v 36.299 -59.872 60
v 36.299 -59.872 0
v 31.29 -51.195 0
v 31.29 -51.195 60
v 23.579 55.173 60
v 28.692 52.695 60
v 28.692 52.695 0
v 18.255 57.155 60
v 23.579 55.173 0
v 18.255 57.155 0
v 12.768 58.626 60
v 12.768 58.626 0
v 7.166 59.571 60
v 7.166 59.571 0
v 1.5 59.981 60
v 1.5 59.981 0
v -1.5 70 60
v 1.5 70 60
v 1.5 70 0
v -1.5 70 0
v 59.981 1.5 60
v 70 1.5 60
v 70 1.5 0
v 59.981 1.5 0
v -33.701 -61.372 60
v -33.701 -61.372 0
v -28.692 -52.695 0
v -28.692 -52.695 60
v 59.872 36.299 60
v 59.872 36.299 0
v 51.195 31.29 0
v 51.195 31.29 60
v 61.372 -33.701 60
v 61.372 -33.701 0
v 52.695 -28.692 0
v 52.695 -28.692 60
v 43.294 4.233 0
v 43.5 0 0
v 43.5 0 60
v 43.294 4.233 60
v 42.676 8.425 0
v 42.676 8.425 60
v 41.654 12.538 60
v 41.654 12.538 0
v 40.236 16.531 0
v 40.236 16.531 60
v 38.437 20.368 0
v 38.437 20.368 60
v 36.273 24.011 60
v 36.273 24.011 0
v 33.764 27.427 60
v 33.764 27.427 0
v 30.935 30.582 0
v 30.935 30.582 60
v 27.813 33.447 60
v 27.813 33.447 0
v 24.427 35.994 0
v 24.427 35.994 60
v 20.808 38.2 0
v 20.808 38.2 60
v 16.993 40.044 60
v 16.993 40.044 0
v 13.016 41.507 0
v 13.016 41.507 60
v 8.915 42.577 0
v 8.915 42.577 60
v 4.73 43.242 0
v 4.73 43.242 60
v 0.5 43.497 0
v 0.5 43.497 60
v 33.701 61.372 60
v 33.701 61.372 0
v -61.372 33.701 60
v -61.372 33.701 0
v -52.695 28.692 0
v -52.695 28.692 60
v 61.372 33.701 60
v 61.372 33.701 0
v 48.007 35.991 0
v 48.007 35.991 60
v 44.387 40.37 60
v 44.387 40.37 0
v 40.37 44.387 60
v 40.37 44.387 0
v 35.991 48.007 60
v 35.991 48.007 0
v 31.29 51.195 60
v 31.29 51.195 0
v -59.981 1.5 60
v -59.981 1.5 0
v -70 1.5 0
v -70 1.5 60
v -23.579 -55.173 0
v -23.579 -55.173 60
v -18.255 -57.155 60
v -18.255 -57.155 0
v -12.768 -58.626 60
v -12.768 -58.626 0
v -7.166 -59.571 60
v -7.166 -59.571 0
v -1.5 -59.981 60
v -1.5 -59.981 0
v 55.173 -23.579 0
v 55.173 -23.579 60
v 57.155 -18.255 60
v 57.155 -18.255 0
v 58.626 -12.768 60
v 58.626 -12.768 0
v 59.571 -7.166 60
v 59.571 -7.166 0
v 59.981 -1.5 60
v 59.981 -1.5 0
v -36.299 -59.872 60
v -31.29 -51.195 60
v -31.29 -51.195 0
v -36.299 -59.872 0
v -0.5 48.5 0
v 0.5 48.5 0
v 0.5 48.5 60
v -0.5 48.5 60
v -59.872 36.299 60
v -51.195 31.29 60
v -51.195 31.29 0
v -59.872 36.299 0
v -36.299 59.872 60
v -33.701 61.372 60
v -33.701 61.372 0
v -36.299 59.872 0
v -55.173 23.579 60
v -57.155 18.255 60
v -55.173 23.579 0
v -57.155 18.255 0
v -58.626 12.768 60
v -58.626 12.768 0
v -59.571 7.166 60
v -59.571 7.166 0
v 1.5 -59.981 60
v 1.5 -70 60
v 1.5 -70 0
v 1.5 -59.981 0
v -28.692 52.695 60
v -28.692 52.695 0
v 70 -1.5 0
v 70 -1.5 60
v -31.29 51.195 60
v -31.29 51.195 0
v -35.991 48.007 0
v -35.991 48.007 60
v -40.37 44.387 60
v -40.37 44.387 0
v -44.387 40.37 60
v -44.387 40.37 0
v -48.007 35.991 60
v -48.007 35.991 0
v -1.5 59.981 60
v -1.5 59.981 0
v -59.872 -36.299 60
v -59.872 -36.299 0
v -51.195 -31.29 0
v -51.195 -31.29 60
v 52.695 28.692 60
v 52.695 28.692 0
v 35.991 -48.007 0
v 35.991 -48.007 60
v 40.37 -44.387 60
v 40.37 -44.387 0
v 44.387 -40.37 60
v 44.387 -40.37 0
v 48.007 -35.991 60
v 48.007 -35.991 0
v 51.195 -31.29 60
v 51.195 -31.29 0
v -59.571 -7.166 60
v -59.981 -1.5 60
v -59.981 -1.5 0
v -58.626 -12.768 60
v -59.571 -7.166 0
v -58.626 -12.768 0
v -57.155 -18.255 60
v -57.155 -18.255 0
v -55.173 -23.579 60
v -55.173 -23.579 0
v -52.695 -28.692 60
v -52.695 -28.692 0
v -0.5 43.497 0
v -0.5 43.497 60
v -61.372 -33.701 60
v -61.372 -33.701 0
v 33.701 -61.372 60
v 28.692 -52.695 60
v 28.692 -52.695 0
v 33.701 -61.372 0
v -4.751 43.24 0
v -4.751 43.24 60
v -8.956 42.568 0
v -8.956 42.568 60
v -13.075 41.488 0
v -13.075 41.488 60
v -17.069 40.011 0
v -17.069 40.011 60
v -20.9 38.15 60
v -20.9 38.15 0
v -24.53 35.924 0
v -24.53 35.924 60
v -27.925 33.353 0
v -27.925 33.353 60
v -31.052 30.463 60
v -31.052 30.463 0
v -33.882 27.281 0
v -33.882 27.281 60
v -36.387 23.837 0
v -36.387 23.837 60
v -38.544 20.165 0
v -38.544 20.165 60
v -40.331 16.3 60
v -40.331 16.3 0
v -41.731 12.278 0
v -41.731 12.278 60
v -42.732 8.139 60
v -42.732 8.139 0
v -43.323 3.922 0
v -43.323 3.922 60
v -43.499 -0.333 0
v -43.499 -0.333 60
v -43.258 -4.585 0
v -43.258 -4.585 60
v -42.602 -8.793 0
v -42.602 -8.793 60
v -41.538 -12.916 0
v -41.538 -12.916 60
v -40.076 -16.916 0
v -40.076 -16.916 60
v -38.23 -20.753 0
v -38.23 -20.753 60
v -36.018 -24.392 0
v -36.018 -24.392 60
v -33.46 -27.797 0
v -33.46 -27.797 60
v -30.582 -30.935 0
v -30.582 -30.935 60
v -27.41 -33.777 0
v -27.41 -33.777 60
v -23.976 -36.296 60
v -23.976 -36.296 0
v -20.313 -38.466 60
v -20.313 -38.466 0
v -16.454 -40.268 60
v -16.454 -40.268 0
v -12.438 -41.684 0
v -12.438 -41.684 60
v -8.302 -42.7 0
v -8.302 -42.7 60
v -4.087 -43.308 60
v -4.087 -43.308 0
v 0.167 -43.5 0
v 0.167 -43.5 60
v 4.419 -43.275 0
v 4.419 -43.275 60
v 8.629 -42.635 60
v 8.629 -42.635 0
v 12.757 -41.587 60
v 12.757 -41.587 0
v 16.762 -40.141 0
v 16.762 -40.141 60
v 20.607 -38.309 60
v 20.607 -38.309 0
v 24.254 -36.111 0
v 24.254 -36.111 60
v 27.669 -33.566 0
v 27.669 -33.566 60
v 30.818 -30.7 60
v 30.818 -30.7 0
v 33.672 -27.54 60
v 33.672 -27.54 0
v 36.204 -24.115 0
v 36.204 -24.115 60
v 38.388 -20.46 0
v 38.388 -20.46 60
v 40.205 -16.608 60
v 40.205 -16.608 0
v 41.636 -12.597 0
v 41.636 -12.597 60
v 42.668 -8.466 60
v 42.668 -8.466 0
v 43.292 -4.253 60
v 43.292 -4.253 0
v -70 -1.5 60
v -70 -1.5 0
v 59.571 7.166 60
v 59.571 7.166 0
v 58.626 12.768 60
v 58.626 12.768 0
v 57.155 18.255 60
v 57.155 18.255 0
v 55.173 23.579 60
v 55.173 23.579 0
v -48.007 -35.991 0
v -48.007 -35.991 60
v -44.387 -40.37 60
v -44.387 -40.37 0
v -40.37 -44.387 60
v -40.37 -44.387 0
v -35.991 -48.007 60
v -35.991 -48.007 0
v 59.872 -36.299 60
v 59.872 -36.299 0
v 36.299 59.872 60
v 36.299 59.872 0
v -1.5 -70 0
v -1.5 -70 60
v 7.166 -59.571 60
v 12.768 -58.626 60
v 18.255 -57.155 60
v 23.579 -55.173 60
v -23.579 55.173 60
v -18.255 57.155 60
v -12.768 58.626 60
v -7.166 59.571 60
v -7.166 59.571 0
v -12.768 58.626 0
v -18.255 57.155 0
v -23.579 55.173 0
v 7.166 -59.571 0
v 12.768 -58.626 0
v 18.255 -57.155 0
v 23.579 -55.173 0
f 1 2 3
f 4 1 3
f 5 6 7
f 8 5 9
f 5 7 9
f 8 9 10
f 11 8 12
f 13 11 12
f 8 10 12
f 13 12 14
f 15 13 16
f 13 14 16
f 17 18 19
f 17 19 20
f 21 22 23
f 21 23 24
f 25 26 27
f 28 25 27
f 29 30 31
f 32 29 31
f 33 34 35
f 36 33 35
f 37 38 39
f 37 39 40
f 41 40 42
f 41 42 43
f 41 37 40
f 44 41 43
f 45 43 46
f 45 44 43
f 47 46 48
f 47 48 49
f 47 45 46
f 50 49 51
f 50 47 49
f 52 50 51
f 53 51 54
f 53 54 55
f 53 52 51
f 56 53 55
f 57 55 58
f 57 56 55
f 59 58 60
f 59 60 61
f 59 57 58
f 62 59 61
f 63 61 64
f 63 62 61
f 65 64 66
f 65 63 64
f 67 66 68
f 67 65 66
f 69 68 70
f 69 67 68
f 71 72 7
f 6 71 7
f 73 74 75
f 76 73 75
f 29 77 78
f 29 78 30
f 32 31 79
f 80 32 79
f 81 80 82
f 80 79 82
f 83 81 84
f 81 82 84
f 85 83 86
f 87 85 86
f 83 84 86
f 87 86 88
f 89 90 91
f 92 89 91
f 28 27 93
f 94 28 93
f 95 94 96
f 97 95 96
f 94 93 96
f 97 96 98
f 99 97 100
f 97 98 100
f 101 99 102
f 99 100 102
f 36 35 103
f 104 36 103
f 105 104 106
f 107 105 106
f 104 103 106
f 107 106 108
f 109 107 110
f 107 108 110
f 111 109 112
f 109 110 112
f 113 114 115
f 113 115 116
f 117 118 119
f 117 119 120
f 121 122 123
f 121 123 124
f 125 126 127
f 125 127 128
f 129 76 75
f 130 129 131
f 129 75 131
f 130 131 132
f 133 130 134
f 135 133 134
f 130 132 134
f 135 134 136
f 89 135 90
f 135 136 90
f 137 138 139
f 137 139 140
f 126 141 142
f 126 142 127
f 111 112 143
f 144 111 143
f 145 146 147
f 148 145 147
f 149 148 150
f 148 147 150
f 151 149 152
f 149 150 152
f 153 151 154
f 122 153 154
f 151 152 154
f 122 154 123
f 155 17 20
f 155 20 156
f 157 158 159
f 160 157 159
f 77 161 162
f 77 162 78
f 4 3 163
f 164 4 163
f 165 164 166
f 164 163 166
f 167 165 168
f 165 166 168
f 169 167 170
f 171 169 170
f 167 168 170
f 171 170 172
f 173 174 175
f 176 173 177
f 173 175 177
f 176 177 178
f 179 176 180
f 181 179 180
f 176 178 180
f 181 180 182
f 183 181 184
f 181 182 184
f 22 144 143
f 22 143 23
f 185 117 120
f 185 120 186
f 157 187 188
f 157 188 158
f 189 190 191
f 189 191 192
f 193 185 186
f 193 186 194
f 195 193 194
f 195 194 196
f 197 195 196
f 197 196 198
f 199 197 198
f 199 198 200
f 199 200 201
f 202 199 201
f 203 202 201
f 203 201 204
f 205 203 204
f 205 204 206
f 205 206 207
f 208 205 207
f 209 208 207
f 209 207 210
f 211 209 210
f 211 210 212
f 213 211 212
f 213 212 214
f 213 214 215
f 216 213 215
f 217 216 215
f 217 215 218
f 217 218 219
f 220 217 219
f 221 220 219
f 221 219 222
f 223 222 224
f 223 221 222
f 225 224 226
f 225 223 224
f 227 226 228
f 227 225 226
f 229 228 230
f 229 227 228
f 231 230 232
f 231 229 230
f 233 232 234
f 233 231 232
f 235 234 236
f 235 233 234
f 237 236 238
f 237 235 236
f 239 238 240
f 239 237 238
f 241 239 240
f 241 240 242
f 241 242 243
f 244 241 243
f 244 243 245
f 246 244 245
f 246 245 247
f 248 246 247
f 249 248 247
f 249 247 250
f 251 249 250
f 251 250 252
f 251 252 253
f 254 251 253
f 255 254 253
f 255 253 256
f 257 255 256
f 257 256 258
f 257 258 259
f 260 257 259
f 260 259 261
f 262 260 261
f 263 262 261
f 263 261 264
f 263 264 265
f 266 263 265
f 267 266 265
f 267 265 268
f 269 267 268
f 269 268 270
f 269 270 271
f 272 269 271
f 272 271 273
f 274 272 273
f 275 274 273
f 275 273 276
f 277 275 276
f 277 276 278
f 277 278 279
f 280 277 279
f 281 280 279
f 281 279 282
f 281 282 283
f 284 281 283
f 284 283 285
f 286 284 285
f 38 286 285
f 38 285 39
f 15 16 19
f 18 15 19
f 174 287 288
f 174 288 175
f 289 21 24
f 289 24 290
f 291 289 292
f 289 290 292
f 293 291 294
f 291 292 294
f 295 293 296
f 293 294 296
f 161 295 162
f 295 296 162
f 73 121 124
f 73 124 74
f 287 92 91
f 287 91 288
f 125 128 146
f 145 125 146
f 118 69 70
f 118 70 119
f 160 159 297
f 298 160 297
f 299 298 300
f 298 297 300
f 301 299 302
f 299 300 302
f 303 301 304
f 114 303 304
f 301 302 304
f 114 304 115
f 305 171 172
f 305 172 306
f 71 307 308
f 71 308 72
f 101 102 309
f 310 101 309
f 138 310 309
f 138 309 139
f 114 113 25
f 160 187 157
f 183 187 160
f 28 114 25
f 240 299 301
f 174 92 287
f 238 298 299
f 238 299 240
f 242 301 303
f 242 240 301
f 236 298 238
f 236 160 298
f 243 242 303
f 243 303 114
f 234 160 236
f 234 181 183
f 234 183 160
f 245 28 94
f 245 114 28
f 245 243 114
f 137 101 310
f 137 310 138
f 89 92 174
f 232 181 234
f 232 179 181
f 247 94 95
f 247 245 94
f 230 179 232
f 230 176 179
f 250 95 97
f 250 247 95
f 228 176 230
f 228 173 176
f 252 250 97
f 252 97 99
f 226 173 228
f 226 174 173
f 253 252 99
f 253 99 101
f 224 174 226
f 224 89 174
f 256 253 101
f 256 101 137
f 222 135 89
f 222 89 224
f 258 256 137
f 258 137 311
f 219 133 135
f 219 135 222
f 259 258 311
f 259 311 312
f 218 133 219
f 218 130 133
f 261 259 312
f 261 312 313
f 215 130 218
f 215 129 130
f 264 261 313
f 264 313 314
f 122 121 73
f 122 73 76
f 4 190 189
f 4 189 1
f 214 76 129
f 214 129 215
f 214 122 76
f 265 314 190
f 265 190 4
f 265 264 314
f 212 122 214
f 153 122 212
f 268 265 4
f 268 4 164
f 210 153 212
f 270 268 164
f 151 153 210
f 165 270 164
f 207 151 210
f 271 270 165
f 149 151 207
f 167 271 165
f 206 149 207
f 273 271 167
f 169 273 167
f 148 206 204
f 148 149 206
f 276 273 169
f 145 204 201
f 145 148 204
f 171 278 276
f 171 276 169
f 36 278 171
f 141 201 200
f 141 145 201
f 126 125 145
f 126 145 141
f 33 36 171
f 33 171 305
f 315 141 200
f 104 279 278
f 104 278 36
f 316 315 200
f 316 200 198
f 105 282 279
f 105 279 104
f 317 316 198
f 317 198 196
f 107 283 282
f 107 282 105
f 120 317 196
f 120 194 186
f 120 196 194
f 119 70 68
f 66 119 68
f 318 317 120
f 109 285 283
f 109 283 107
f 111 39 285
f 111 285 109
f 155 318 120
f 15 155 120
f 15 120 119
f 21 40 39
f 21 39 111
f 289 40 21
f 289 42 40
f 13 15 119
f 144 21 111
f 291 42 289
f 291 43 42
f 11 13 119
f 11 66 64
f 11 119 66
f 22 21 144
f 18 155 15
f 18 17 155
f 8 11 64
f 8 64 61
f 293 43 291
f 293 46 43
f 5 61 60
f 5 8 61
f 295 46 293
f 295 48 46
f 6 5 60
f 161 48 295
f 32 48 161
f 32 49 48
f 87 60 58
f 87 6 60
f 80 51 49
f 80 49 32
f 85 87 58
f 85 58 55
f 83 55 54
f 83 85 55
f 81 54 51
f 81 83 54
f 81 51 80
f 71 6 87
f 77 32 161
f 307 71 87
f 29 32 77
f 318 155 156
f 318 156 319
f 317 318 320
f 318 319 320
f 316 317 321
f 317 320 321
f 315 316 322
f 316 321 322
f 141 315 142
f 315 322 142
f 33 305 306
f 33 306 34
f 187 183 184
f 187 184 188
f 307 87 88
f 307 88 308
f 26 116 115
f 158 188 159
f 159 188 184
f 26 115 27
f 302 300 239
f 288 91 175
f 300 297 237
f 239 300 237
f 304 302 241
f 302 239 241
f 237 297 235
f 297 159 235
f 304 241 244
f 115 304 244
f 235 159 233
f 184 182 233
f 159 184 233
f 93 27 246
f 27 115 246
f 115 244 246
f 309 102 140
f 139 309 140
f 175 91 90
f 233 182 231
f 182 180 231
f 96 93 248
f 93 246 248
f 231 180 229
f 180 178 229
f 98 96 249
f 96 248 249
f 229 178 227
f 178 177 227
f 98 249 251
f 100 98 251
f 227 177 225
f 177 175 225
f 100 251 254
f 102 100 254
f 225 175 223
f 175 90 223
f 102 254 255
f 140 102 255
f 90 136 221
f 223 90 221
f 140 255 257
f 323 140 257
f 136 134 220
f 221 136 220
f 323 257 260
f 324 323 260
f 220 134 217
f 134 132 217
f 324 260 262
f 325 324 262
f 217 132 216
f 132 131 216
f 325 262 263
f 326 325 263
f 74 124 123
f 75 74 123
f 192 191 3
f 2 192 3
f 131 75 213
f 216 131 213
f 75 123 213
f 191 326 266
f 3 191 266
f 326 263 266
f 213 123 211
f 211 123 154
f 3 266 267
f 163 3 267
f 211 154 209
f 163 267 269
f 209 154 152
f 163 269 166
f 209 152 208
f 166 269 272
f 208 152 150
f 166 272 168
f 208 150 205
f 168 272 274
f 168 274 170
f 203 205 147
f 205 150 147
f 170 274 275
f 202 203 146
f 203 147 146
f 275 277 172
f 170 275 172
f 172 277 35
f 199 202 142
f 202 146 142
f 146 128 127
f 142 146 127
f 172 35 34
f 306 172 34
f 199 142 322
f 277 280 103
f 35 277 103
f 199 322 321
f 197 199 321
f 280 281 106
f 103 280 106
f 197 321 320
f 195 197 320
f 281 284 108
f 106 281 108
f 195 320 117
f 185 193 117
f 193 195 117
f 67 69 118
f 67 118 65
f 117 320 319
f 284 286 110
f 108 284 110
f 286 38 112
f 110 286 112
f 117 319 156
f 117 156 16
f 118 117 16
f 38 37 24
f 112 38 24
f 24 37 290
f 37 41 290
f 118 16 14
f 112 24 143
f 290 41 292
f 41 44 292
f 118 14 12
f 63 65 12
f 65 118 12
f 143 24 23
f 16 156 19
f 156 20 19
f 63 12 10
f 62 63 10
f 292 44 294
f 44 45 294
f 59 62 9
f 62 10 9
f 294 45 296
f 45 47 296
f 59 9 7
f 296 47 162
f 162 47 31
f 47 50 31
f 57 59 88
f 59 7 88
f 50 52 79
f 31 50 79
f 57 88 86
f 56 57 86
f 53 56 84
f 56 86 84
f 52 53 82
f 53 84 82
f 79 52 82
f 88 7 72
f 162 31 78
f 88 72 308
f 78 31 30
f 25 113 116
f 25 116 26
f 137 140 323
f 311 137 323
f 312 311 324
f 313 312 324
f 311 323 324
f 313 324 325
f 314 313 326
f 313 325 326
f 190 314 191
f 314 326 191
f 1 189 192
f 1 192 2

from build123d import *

# Parameters (mm, degrees)
SKETCH1_R           = 60
SKETCH1_R_2         = 43.5
EXTRUSION1_DEPTH    = 60
EXTRUSION3_START    = -60
EXTRUSION3_DEPTH    = 60
BOSS_EXTRUDE2_DEPTH = 60


with BuildPart() as part:
    # Sketch1 → Extrusion1 (new body)
    with BuildSketch(Plane.XY):
        Circle(SKETCH1_R)
        Circle(SKETCH1_R_2, mode=Mode.SUBTRACT)
    extrude(amount=EXTRUSION1_DEPTH)

    # Sketch3 → Extrusion3 (cut)
    with BuildSketch(Plane.XY.offset(60).offset(EXTRUSION3_START)):
        with BuildLine():
            Line((-0.5, 48.5), (-0.5, 43.497126342))
            ThreePointArc((-0.5, 43.497126342), (0, 43.5), (0.5, 43.497126342))
            Line((0.5, 43.497126342), (0.5, 48.5))
            Line((0.5, 48.5), (-0.5, 48.5))
        make_face()
    extrude(amount=EXTRUSION3_DEPTH, mode=Mode.SUBTRACT)

    # Sketch2 → Boss-Extrude2 (add, through all)
    with BuildSketch(Plane.XY.offset(60)):
        with BuildLine():
            Line((33.700961894, 61.371778265), (28.691585429, 52.695283713))
            ThreePointArc((28.691585429, 52.695283713), (30, 51.961524227), (31.28966164, 51.195283713))
            Line((31.28966164, 51.195283713), (36.299038106, 59.871778265))
            Line((36.299038106, 59.871778265), (33.700961894, 61.371778265))
        make_face()
        with BuildLine():
            Line((-1.5, 70), (-1.5, 59.981247069))
            ThreePointArc((-1.5, 59.981247069), (0, 60), (1.5, 59.981247069))
            Line((1.5, 59.981247069), (1.5, 70))
            Line((1.5, 70), (-1.5, 70))
        make_face()
        with BuildLine():
            Line((59.871778265, 36.299038106), (51.195283713, 31.28966164))
            ThreePointArc((51.195283713, 31.28966164), (51.961524227, 30), (52.695283713, 28.691585429))
            Line((52.695283713, 28.691585429), (61.371778265, 33.700961894))
            Line((61.371778265, 33.700961894), (59.871778265, 36.299038106))
        make_face()
        with BuildLine():
            Line((70, 1.5), (59.981247069, 1.5))
            ThreePointArc((59.981247069, 1.5), (60, 0), (59.981247069, -1.5))
            Line((59.981247069, -1.5), (70, -1.5))
            Line((70, -1.5), (70, 1.5))
        make_face()
        with BuildLine():
            Line((61.371778265, -33.700961894), (52.695283713, -28.691585429))
            ThreePointArc((52.695283713, -28.691585429), (51.961524227, -30), (51.195283713, -31.28966164))
            Line((51.195283713, -31.28966164), (59.871778265, -36.299038106))
            Line((59.871778265, -36.299038106), (61.371778265, -33.700961894))
        make_face()
        with BuildLine():
            Line((36.299038106, -59.871778265), (31.28966164, -51.195283713))
            ThreePointArc((31.28966164, -51.195283713), (30, -51.961524227), (28.691585429, -52.695283713))
            Line((28.691585429, -52.695283713), (33.700961894, -61.371778265))
            Line((33.700961894, -61.371778265), (36.299038106, -59.871778265))
        make_face()
        with BuildLine():
            Line((1.5, -70), (1.5, -59.981247069))
            ThreePointArc((1.5, -59.981247069), (0, -60), (-1.5, -59.981247069))
            Line((-1.5, -59.981247069), (-1.5, -70))
            Line((-1.5, -70), (1.5, -70))
        make_face()
        with BuildLine():
            Line((-33.700961894, -61.371778265), (-28.691585429, -52.695283713))
            ThreePointArc((-28.691585429, -52.695283713), (-30, -51.961524227), (-31.28966164, -51.195283713))
            Line((-31.28966164, -51.195283713), (-36.299038106, -59.871778265))
            Line((-36.299038106, -59.871778265), (-33.700961894, -61.371778265))
        make_face()
        with BuildLine():
            Line((-59.871778265, -36.299038106), (-51.195283713, -31.28966164))
            ThreePointArc((-51.195283713, -31.28966164), (-51.961524227, -30), (-52.695283713, -28.691585429))
            Line((-52.695283713, -28.691585429), (-61.371778265, -33.700961894))
            Line((-61.371778265, -33.700961894), (-59.871778265, -36.299038106))
        make_face()
        with BuildLine():
            Line((-70, -1.5), (-59.981247069, -1.5))
            ThreePointArc((-59.981247069, -1.5), (-60, 0), (-59.981247069, 1.5))
            Line((-59.981247069, 1.5), (-70, 1.5))
            Line((-70, 1.5), (-70, -1.5))
        make_face()
        with BuildLine():
            Line((-61.371778265, 33.700961894), (-52.695283713, 28.691585429))
            ThreePointArc((-52.695283713, 28.691585429), (-51.961524227, 30), (-51.195283713, 31.28966164))
            Line((-51.195283713, 31.28966164), (-59.871778265, 36.299038106))
            Line((-59.871778265, 36.299038106), (-61.371778265, 33.700961894))
        make_face()
        with BuildLine():
            Line((-36.299038106, 59.871778265), (-31.28966164, 51.195283713))
            ThreePointArc((-31.28966164, 51.195283713), (-30, 51.961524227), (-28.691585429, 52.695283713))
            Line((-28.691585429, 52.695283713), (-33.700961894, 61.371778265))
            Line((-33.700961894, 61.371778265), (-36.299038106, 59.871778265))
        make_face()
    extrude(amount=-BOSS_EXTRUDE2_DEPTH)


solid = part.part
